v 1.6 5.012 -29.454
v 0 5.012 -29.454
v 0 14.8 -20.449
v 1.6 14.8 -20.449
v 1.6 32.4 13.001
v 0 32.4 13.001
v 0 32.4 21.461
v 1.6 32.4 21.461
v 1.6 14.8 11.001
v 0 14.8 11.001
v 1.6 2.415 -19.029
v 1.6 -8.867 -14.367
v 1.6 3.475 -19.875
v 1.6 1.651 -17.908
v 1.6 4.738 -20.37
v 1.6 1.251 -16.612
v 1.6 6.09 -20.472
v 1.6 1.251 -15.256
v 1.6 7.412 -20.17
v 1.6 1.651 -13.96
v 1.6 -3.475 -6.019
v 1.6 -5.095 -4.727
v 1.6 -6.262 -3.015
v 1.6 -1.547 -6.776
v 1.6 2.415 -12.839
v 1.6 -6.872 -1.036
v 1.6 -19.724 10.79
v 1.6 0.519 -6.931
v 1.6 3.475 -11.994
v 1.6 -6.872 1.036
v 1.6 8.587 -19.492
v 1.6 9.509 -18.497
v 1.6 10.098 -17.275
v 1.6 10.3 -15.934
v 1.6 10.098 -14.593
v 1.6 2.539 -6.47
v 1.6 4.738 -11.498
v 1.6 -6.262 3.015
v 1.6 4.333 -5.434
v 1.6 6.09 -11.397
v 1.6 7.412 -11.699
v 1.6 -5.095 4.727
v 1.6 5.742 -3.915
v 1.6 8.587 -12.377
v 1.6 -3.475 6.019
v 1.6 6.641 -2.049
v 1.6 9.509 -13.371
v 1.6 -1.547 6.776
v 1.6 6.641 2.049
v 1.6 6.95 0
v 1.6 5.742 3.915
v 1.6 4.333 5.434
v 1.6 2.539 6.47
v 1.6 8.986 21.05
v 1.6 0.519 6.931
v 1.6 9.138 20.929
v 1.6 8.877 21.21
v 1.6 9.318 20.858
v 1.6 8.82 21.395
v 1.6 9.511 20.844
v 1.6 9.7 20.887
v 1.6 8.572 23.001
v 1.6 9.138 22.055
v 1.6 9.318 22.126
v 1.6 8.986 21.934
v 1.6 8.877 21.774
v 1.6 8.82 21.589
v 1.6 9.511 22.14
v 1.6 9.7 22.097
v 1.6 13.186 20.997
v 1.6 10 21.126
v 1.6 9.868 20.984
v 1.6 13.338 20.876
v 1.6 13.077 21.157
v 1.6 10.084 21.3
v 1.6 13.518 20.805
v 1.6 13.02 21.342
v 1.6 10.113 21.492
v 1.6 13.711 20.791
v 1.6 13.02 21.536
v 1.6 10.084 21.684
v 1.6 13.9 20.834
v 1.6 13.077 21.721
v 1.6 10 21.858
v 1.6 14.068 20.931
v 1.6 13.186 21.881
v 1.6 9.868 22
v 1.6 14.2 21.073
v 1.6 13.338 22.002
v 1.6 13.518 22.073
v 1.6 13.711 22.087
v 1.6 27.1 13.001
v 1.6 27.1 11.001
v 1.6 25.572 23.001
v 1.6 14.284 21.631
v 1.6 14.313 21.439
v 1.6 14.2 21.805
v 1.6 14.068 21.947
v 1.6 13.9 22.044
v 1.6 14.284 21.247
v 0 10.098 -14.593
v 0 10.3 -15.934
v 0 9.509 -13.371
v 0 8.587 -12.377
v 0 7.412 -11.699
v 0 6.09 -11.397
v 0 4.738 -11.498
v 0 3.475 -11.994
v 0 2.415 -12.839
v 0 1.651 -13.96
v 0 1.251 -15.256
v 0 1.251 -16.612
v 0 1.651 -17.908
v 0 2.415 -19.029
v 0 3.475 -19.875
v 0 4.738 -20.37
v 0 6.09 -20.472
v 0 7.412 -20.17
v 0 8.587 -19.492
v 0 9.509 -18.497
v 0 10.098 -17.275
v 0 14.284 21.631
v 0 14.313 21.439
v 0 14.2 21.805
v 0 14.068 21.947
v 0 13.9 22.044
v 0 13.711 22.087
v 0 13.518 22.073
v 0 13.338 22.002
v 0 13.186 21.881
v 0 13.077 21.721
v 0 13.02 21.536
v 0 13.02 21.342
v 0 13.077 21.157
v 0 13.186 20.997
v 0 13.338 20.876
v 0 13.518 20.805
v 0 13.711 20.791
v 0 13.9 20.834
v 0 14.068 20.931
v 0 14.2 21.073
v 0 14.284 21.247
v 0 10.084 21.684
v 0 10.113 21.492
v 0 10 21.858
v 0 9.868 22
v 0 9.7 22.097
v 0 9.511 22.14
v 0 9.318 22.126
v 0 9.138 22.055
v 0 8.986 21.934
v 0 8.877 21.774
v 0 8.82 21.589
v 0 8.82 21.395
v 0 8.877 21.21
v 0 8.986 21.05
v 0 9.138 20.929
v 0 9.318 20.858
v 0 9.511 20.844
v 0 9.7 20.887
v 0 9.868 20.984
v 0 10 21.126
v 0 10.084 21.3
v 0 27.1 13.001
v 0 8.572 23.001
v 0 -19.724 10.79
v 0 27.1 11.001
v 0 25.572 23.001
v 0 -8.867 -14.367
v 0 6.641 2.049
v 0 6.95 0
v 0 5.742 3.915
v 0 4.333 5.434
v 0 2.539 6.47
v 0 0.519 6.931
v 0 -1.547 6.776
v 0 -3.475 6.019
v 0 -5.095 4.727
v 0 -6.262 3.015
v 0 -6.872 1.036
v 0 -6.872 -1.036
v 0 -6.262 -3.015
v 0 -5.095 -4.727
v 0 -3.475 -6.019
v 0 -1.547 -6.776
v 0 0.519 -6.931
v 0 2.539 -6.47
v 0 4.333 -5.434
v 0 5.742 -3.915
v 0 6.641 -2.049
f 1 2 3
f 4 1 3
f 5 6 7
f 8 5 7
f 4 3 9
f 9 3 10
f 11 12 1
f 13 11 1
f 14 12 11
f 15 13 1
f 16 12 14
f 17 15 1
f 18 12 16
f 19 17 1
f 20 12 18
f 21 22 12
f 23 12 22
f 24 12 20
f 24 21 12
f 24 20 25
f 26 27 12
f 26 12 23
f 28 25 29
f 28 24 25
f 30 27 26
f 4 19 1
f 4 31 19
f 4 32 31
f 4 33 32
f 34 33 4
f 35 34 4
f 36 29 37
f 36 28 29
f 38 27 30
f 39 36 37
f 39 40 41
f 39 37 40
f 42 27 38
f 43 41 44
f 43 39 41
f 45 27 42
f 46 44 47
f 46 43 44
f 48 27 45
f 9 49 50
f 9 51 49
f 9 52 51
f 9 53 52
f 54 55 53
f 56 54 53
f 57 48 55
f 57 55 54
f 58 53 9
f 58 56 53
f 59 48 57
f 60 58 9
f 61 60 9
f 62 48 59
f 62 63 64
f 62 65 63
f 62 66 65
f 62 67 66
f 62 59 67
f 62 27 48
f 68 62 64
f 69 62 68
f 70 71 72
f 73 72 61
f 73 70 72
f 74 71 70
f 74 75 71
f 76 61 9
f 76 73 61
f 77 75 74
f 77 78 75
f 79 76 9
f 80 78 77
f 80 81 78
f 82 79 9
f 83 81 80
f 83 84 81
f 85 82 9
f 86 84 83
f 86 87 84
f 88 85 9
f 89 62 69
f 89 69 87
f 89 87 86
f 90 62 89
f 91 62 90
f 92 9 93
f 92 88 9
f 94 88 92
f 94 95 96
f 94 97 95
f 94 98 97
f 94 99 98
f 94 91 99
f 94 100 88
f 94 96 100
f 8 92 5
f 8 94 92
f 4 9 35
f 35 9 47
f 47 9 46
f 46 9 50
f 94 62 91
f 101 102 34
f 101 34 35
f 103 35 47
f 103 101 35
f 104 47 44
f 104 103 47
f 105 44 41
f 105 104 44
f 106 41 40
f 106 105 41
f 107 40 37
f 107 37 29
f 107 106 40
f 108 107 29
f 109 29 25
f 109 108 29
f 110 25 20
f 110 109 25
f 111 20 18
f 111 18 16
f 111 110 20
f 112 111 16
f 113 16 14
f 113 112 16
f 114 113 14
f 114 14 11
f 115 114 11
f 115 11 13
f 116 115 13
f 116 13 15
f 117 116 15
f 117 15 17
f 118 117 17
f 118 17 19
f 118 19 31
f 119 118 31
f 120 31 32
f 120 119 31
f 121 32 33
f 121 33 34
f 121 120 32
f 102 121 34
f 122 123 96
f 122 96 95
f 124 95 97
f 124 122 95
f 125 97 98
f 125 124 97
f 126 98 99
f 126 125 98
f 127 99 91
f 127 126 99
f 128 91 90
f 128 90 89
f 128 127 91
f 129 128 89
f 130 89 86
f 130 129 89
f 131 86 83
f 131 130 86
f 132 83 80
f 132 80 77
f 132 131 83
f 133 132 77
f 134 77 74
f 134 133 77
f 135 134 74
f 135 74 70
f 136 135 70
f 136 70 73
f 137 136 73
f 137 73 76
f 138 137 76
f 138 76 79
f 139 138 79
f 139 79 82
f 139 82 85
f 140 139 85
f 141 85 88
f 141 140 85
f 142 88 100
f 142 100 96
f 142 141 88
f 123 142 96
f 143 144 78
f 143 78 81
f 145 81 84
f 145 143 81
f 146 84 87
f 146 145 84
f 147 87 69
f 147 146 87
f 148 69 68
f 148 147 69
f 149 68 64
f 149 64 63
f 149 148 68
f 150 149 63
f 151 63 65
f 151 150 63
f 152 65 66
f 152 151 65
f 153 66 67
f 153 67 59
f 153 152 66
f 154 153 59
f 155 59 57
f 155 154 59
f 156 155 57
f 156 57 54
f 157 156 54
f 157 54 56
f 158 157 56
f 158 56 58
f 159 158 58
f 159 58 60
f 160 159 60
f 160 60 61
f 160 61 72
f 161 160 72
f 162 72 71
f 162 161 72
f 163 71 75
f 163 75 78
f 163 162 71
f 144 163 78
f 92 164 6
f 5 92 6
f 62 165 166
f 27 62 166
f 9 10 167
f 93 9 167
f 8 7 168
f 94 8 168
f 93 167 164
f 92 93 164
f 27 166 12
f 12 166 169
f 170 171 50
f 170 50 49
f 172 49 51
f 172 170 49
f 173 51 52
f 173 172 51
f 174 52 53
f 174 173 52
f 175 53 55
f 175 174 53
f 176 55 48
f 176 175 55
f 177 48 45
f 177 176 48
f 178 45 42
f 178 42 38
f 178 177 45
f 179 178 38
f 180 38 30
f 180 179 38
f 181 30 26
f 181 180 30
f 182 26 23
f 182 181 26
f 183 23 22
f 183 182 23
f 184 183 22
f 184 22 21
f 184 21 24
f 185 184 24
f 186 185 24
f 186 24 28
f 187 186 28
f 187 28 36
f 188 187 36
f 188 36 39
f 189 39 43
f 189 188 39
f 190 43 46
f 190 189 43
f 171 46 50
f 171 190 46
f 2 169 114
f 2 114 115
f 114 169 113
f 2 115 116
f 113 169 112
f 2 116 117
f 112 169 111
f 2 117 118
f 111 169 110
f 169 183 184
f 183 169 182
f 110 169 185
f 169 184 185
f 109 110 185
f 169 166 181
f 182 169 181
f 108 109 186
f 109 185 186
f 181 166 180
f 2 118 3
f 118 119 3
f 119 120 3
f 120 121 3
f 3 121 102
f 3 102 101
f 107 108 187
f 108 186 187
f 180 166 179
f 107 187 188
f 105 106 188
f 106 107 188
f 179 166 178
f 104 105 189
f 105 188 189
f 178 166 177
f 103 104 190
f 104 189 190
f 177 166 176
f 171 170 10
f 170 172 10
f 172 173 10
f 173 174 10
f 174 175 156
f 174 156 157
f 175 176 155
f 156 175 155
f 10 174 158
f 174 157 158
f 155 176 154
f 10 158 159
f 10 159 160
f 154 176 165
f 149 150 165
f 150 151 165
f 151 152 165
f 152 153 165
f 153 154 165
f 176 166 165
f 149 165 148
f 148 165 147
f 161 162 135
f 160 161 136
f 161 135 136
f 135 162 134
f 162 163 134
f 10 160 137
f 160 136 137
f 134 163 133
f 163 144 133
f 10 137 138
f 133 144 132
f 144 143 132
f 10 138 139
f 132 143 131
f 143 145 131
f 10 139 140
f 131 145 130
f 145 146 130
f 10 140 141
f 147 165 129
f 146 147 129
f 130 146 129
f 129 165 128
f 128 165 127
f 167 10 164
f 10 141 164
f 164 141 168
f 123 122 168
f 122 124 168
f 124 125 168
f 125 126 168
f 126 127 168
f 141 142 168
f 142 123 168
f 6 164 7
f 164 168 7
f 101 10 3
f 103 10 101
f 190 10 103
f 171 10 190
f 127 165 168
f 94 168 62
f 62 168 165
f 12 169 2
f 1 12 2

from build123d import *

# Parameters (mm, degrees)
F0_R     = 4.55
F0_R_2   = 6.95
F0_R_3   = 0.65
F1_DEPTH = 1.6


with BuildPart() as f1:
    # F0 (on Right) → F1 (new body)
    with BuildSketch(Plane.YZ):
        Polygon((5.01199, -29.453935), (14.8, -20.449221), (14.8, 11.000779), (27.1, 11.000779), (27.1, 13.000779), (32.4, 13.000779), (32.4, 21.460779), (25.571501, 23.000779), (8.571501, 23.000779), (-19.723812, 10.790342), (-8.867455, -14.367152), align=None)
        with Locations((5.75, -15.934274)):
            Circle(F0_R, mode=Mode.SUBTRACT)
        Circle(F0_R_2, mode=Mode.SUBTRACT)
        with Locations((9.462554, 21.492073)):
            Circle(F0_R_3, mode=Mode.SUBTRACT)
        with Locations((13.662554, 21.43904)):
            Circle(F0_R_3, mode=Mode.SUBTRACT)
    extrude(amount=F1_DEPTH)


solid = f1.part
